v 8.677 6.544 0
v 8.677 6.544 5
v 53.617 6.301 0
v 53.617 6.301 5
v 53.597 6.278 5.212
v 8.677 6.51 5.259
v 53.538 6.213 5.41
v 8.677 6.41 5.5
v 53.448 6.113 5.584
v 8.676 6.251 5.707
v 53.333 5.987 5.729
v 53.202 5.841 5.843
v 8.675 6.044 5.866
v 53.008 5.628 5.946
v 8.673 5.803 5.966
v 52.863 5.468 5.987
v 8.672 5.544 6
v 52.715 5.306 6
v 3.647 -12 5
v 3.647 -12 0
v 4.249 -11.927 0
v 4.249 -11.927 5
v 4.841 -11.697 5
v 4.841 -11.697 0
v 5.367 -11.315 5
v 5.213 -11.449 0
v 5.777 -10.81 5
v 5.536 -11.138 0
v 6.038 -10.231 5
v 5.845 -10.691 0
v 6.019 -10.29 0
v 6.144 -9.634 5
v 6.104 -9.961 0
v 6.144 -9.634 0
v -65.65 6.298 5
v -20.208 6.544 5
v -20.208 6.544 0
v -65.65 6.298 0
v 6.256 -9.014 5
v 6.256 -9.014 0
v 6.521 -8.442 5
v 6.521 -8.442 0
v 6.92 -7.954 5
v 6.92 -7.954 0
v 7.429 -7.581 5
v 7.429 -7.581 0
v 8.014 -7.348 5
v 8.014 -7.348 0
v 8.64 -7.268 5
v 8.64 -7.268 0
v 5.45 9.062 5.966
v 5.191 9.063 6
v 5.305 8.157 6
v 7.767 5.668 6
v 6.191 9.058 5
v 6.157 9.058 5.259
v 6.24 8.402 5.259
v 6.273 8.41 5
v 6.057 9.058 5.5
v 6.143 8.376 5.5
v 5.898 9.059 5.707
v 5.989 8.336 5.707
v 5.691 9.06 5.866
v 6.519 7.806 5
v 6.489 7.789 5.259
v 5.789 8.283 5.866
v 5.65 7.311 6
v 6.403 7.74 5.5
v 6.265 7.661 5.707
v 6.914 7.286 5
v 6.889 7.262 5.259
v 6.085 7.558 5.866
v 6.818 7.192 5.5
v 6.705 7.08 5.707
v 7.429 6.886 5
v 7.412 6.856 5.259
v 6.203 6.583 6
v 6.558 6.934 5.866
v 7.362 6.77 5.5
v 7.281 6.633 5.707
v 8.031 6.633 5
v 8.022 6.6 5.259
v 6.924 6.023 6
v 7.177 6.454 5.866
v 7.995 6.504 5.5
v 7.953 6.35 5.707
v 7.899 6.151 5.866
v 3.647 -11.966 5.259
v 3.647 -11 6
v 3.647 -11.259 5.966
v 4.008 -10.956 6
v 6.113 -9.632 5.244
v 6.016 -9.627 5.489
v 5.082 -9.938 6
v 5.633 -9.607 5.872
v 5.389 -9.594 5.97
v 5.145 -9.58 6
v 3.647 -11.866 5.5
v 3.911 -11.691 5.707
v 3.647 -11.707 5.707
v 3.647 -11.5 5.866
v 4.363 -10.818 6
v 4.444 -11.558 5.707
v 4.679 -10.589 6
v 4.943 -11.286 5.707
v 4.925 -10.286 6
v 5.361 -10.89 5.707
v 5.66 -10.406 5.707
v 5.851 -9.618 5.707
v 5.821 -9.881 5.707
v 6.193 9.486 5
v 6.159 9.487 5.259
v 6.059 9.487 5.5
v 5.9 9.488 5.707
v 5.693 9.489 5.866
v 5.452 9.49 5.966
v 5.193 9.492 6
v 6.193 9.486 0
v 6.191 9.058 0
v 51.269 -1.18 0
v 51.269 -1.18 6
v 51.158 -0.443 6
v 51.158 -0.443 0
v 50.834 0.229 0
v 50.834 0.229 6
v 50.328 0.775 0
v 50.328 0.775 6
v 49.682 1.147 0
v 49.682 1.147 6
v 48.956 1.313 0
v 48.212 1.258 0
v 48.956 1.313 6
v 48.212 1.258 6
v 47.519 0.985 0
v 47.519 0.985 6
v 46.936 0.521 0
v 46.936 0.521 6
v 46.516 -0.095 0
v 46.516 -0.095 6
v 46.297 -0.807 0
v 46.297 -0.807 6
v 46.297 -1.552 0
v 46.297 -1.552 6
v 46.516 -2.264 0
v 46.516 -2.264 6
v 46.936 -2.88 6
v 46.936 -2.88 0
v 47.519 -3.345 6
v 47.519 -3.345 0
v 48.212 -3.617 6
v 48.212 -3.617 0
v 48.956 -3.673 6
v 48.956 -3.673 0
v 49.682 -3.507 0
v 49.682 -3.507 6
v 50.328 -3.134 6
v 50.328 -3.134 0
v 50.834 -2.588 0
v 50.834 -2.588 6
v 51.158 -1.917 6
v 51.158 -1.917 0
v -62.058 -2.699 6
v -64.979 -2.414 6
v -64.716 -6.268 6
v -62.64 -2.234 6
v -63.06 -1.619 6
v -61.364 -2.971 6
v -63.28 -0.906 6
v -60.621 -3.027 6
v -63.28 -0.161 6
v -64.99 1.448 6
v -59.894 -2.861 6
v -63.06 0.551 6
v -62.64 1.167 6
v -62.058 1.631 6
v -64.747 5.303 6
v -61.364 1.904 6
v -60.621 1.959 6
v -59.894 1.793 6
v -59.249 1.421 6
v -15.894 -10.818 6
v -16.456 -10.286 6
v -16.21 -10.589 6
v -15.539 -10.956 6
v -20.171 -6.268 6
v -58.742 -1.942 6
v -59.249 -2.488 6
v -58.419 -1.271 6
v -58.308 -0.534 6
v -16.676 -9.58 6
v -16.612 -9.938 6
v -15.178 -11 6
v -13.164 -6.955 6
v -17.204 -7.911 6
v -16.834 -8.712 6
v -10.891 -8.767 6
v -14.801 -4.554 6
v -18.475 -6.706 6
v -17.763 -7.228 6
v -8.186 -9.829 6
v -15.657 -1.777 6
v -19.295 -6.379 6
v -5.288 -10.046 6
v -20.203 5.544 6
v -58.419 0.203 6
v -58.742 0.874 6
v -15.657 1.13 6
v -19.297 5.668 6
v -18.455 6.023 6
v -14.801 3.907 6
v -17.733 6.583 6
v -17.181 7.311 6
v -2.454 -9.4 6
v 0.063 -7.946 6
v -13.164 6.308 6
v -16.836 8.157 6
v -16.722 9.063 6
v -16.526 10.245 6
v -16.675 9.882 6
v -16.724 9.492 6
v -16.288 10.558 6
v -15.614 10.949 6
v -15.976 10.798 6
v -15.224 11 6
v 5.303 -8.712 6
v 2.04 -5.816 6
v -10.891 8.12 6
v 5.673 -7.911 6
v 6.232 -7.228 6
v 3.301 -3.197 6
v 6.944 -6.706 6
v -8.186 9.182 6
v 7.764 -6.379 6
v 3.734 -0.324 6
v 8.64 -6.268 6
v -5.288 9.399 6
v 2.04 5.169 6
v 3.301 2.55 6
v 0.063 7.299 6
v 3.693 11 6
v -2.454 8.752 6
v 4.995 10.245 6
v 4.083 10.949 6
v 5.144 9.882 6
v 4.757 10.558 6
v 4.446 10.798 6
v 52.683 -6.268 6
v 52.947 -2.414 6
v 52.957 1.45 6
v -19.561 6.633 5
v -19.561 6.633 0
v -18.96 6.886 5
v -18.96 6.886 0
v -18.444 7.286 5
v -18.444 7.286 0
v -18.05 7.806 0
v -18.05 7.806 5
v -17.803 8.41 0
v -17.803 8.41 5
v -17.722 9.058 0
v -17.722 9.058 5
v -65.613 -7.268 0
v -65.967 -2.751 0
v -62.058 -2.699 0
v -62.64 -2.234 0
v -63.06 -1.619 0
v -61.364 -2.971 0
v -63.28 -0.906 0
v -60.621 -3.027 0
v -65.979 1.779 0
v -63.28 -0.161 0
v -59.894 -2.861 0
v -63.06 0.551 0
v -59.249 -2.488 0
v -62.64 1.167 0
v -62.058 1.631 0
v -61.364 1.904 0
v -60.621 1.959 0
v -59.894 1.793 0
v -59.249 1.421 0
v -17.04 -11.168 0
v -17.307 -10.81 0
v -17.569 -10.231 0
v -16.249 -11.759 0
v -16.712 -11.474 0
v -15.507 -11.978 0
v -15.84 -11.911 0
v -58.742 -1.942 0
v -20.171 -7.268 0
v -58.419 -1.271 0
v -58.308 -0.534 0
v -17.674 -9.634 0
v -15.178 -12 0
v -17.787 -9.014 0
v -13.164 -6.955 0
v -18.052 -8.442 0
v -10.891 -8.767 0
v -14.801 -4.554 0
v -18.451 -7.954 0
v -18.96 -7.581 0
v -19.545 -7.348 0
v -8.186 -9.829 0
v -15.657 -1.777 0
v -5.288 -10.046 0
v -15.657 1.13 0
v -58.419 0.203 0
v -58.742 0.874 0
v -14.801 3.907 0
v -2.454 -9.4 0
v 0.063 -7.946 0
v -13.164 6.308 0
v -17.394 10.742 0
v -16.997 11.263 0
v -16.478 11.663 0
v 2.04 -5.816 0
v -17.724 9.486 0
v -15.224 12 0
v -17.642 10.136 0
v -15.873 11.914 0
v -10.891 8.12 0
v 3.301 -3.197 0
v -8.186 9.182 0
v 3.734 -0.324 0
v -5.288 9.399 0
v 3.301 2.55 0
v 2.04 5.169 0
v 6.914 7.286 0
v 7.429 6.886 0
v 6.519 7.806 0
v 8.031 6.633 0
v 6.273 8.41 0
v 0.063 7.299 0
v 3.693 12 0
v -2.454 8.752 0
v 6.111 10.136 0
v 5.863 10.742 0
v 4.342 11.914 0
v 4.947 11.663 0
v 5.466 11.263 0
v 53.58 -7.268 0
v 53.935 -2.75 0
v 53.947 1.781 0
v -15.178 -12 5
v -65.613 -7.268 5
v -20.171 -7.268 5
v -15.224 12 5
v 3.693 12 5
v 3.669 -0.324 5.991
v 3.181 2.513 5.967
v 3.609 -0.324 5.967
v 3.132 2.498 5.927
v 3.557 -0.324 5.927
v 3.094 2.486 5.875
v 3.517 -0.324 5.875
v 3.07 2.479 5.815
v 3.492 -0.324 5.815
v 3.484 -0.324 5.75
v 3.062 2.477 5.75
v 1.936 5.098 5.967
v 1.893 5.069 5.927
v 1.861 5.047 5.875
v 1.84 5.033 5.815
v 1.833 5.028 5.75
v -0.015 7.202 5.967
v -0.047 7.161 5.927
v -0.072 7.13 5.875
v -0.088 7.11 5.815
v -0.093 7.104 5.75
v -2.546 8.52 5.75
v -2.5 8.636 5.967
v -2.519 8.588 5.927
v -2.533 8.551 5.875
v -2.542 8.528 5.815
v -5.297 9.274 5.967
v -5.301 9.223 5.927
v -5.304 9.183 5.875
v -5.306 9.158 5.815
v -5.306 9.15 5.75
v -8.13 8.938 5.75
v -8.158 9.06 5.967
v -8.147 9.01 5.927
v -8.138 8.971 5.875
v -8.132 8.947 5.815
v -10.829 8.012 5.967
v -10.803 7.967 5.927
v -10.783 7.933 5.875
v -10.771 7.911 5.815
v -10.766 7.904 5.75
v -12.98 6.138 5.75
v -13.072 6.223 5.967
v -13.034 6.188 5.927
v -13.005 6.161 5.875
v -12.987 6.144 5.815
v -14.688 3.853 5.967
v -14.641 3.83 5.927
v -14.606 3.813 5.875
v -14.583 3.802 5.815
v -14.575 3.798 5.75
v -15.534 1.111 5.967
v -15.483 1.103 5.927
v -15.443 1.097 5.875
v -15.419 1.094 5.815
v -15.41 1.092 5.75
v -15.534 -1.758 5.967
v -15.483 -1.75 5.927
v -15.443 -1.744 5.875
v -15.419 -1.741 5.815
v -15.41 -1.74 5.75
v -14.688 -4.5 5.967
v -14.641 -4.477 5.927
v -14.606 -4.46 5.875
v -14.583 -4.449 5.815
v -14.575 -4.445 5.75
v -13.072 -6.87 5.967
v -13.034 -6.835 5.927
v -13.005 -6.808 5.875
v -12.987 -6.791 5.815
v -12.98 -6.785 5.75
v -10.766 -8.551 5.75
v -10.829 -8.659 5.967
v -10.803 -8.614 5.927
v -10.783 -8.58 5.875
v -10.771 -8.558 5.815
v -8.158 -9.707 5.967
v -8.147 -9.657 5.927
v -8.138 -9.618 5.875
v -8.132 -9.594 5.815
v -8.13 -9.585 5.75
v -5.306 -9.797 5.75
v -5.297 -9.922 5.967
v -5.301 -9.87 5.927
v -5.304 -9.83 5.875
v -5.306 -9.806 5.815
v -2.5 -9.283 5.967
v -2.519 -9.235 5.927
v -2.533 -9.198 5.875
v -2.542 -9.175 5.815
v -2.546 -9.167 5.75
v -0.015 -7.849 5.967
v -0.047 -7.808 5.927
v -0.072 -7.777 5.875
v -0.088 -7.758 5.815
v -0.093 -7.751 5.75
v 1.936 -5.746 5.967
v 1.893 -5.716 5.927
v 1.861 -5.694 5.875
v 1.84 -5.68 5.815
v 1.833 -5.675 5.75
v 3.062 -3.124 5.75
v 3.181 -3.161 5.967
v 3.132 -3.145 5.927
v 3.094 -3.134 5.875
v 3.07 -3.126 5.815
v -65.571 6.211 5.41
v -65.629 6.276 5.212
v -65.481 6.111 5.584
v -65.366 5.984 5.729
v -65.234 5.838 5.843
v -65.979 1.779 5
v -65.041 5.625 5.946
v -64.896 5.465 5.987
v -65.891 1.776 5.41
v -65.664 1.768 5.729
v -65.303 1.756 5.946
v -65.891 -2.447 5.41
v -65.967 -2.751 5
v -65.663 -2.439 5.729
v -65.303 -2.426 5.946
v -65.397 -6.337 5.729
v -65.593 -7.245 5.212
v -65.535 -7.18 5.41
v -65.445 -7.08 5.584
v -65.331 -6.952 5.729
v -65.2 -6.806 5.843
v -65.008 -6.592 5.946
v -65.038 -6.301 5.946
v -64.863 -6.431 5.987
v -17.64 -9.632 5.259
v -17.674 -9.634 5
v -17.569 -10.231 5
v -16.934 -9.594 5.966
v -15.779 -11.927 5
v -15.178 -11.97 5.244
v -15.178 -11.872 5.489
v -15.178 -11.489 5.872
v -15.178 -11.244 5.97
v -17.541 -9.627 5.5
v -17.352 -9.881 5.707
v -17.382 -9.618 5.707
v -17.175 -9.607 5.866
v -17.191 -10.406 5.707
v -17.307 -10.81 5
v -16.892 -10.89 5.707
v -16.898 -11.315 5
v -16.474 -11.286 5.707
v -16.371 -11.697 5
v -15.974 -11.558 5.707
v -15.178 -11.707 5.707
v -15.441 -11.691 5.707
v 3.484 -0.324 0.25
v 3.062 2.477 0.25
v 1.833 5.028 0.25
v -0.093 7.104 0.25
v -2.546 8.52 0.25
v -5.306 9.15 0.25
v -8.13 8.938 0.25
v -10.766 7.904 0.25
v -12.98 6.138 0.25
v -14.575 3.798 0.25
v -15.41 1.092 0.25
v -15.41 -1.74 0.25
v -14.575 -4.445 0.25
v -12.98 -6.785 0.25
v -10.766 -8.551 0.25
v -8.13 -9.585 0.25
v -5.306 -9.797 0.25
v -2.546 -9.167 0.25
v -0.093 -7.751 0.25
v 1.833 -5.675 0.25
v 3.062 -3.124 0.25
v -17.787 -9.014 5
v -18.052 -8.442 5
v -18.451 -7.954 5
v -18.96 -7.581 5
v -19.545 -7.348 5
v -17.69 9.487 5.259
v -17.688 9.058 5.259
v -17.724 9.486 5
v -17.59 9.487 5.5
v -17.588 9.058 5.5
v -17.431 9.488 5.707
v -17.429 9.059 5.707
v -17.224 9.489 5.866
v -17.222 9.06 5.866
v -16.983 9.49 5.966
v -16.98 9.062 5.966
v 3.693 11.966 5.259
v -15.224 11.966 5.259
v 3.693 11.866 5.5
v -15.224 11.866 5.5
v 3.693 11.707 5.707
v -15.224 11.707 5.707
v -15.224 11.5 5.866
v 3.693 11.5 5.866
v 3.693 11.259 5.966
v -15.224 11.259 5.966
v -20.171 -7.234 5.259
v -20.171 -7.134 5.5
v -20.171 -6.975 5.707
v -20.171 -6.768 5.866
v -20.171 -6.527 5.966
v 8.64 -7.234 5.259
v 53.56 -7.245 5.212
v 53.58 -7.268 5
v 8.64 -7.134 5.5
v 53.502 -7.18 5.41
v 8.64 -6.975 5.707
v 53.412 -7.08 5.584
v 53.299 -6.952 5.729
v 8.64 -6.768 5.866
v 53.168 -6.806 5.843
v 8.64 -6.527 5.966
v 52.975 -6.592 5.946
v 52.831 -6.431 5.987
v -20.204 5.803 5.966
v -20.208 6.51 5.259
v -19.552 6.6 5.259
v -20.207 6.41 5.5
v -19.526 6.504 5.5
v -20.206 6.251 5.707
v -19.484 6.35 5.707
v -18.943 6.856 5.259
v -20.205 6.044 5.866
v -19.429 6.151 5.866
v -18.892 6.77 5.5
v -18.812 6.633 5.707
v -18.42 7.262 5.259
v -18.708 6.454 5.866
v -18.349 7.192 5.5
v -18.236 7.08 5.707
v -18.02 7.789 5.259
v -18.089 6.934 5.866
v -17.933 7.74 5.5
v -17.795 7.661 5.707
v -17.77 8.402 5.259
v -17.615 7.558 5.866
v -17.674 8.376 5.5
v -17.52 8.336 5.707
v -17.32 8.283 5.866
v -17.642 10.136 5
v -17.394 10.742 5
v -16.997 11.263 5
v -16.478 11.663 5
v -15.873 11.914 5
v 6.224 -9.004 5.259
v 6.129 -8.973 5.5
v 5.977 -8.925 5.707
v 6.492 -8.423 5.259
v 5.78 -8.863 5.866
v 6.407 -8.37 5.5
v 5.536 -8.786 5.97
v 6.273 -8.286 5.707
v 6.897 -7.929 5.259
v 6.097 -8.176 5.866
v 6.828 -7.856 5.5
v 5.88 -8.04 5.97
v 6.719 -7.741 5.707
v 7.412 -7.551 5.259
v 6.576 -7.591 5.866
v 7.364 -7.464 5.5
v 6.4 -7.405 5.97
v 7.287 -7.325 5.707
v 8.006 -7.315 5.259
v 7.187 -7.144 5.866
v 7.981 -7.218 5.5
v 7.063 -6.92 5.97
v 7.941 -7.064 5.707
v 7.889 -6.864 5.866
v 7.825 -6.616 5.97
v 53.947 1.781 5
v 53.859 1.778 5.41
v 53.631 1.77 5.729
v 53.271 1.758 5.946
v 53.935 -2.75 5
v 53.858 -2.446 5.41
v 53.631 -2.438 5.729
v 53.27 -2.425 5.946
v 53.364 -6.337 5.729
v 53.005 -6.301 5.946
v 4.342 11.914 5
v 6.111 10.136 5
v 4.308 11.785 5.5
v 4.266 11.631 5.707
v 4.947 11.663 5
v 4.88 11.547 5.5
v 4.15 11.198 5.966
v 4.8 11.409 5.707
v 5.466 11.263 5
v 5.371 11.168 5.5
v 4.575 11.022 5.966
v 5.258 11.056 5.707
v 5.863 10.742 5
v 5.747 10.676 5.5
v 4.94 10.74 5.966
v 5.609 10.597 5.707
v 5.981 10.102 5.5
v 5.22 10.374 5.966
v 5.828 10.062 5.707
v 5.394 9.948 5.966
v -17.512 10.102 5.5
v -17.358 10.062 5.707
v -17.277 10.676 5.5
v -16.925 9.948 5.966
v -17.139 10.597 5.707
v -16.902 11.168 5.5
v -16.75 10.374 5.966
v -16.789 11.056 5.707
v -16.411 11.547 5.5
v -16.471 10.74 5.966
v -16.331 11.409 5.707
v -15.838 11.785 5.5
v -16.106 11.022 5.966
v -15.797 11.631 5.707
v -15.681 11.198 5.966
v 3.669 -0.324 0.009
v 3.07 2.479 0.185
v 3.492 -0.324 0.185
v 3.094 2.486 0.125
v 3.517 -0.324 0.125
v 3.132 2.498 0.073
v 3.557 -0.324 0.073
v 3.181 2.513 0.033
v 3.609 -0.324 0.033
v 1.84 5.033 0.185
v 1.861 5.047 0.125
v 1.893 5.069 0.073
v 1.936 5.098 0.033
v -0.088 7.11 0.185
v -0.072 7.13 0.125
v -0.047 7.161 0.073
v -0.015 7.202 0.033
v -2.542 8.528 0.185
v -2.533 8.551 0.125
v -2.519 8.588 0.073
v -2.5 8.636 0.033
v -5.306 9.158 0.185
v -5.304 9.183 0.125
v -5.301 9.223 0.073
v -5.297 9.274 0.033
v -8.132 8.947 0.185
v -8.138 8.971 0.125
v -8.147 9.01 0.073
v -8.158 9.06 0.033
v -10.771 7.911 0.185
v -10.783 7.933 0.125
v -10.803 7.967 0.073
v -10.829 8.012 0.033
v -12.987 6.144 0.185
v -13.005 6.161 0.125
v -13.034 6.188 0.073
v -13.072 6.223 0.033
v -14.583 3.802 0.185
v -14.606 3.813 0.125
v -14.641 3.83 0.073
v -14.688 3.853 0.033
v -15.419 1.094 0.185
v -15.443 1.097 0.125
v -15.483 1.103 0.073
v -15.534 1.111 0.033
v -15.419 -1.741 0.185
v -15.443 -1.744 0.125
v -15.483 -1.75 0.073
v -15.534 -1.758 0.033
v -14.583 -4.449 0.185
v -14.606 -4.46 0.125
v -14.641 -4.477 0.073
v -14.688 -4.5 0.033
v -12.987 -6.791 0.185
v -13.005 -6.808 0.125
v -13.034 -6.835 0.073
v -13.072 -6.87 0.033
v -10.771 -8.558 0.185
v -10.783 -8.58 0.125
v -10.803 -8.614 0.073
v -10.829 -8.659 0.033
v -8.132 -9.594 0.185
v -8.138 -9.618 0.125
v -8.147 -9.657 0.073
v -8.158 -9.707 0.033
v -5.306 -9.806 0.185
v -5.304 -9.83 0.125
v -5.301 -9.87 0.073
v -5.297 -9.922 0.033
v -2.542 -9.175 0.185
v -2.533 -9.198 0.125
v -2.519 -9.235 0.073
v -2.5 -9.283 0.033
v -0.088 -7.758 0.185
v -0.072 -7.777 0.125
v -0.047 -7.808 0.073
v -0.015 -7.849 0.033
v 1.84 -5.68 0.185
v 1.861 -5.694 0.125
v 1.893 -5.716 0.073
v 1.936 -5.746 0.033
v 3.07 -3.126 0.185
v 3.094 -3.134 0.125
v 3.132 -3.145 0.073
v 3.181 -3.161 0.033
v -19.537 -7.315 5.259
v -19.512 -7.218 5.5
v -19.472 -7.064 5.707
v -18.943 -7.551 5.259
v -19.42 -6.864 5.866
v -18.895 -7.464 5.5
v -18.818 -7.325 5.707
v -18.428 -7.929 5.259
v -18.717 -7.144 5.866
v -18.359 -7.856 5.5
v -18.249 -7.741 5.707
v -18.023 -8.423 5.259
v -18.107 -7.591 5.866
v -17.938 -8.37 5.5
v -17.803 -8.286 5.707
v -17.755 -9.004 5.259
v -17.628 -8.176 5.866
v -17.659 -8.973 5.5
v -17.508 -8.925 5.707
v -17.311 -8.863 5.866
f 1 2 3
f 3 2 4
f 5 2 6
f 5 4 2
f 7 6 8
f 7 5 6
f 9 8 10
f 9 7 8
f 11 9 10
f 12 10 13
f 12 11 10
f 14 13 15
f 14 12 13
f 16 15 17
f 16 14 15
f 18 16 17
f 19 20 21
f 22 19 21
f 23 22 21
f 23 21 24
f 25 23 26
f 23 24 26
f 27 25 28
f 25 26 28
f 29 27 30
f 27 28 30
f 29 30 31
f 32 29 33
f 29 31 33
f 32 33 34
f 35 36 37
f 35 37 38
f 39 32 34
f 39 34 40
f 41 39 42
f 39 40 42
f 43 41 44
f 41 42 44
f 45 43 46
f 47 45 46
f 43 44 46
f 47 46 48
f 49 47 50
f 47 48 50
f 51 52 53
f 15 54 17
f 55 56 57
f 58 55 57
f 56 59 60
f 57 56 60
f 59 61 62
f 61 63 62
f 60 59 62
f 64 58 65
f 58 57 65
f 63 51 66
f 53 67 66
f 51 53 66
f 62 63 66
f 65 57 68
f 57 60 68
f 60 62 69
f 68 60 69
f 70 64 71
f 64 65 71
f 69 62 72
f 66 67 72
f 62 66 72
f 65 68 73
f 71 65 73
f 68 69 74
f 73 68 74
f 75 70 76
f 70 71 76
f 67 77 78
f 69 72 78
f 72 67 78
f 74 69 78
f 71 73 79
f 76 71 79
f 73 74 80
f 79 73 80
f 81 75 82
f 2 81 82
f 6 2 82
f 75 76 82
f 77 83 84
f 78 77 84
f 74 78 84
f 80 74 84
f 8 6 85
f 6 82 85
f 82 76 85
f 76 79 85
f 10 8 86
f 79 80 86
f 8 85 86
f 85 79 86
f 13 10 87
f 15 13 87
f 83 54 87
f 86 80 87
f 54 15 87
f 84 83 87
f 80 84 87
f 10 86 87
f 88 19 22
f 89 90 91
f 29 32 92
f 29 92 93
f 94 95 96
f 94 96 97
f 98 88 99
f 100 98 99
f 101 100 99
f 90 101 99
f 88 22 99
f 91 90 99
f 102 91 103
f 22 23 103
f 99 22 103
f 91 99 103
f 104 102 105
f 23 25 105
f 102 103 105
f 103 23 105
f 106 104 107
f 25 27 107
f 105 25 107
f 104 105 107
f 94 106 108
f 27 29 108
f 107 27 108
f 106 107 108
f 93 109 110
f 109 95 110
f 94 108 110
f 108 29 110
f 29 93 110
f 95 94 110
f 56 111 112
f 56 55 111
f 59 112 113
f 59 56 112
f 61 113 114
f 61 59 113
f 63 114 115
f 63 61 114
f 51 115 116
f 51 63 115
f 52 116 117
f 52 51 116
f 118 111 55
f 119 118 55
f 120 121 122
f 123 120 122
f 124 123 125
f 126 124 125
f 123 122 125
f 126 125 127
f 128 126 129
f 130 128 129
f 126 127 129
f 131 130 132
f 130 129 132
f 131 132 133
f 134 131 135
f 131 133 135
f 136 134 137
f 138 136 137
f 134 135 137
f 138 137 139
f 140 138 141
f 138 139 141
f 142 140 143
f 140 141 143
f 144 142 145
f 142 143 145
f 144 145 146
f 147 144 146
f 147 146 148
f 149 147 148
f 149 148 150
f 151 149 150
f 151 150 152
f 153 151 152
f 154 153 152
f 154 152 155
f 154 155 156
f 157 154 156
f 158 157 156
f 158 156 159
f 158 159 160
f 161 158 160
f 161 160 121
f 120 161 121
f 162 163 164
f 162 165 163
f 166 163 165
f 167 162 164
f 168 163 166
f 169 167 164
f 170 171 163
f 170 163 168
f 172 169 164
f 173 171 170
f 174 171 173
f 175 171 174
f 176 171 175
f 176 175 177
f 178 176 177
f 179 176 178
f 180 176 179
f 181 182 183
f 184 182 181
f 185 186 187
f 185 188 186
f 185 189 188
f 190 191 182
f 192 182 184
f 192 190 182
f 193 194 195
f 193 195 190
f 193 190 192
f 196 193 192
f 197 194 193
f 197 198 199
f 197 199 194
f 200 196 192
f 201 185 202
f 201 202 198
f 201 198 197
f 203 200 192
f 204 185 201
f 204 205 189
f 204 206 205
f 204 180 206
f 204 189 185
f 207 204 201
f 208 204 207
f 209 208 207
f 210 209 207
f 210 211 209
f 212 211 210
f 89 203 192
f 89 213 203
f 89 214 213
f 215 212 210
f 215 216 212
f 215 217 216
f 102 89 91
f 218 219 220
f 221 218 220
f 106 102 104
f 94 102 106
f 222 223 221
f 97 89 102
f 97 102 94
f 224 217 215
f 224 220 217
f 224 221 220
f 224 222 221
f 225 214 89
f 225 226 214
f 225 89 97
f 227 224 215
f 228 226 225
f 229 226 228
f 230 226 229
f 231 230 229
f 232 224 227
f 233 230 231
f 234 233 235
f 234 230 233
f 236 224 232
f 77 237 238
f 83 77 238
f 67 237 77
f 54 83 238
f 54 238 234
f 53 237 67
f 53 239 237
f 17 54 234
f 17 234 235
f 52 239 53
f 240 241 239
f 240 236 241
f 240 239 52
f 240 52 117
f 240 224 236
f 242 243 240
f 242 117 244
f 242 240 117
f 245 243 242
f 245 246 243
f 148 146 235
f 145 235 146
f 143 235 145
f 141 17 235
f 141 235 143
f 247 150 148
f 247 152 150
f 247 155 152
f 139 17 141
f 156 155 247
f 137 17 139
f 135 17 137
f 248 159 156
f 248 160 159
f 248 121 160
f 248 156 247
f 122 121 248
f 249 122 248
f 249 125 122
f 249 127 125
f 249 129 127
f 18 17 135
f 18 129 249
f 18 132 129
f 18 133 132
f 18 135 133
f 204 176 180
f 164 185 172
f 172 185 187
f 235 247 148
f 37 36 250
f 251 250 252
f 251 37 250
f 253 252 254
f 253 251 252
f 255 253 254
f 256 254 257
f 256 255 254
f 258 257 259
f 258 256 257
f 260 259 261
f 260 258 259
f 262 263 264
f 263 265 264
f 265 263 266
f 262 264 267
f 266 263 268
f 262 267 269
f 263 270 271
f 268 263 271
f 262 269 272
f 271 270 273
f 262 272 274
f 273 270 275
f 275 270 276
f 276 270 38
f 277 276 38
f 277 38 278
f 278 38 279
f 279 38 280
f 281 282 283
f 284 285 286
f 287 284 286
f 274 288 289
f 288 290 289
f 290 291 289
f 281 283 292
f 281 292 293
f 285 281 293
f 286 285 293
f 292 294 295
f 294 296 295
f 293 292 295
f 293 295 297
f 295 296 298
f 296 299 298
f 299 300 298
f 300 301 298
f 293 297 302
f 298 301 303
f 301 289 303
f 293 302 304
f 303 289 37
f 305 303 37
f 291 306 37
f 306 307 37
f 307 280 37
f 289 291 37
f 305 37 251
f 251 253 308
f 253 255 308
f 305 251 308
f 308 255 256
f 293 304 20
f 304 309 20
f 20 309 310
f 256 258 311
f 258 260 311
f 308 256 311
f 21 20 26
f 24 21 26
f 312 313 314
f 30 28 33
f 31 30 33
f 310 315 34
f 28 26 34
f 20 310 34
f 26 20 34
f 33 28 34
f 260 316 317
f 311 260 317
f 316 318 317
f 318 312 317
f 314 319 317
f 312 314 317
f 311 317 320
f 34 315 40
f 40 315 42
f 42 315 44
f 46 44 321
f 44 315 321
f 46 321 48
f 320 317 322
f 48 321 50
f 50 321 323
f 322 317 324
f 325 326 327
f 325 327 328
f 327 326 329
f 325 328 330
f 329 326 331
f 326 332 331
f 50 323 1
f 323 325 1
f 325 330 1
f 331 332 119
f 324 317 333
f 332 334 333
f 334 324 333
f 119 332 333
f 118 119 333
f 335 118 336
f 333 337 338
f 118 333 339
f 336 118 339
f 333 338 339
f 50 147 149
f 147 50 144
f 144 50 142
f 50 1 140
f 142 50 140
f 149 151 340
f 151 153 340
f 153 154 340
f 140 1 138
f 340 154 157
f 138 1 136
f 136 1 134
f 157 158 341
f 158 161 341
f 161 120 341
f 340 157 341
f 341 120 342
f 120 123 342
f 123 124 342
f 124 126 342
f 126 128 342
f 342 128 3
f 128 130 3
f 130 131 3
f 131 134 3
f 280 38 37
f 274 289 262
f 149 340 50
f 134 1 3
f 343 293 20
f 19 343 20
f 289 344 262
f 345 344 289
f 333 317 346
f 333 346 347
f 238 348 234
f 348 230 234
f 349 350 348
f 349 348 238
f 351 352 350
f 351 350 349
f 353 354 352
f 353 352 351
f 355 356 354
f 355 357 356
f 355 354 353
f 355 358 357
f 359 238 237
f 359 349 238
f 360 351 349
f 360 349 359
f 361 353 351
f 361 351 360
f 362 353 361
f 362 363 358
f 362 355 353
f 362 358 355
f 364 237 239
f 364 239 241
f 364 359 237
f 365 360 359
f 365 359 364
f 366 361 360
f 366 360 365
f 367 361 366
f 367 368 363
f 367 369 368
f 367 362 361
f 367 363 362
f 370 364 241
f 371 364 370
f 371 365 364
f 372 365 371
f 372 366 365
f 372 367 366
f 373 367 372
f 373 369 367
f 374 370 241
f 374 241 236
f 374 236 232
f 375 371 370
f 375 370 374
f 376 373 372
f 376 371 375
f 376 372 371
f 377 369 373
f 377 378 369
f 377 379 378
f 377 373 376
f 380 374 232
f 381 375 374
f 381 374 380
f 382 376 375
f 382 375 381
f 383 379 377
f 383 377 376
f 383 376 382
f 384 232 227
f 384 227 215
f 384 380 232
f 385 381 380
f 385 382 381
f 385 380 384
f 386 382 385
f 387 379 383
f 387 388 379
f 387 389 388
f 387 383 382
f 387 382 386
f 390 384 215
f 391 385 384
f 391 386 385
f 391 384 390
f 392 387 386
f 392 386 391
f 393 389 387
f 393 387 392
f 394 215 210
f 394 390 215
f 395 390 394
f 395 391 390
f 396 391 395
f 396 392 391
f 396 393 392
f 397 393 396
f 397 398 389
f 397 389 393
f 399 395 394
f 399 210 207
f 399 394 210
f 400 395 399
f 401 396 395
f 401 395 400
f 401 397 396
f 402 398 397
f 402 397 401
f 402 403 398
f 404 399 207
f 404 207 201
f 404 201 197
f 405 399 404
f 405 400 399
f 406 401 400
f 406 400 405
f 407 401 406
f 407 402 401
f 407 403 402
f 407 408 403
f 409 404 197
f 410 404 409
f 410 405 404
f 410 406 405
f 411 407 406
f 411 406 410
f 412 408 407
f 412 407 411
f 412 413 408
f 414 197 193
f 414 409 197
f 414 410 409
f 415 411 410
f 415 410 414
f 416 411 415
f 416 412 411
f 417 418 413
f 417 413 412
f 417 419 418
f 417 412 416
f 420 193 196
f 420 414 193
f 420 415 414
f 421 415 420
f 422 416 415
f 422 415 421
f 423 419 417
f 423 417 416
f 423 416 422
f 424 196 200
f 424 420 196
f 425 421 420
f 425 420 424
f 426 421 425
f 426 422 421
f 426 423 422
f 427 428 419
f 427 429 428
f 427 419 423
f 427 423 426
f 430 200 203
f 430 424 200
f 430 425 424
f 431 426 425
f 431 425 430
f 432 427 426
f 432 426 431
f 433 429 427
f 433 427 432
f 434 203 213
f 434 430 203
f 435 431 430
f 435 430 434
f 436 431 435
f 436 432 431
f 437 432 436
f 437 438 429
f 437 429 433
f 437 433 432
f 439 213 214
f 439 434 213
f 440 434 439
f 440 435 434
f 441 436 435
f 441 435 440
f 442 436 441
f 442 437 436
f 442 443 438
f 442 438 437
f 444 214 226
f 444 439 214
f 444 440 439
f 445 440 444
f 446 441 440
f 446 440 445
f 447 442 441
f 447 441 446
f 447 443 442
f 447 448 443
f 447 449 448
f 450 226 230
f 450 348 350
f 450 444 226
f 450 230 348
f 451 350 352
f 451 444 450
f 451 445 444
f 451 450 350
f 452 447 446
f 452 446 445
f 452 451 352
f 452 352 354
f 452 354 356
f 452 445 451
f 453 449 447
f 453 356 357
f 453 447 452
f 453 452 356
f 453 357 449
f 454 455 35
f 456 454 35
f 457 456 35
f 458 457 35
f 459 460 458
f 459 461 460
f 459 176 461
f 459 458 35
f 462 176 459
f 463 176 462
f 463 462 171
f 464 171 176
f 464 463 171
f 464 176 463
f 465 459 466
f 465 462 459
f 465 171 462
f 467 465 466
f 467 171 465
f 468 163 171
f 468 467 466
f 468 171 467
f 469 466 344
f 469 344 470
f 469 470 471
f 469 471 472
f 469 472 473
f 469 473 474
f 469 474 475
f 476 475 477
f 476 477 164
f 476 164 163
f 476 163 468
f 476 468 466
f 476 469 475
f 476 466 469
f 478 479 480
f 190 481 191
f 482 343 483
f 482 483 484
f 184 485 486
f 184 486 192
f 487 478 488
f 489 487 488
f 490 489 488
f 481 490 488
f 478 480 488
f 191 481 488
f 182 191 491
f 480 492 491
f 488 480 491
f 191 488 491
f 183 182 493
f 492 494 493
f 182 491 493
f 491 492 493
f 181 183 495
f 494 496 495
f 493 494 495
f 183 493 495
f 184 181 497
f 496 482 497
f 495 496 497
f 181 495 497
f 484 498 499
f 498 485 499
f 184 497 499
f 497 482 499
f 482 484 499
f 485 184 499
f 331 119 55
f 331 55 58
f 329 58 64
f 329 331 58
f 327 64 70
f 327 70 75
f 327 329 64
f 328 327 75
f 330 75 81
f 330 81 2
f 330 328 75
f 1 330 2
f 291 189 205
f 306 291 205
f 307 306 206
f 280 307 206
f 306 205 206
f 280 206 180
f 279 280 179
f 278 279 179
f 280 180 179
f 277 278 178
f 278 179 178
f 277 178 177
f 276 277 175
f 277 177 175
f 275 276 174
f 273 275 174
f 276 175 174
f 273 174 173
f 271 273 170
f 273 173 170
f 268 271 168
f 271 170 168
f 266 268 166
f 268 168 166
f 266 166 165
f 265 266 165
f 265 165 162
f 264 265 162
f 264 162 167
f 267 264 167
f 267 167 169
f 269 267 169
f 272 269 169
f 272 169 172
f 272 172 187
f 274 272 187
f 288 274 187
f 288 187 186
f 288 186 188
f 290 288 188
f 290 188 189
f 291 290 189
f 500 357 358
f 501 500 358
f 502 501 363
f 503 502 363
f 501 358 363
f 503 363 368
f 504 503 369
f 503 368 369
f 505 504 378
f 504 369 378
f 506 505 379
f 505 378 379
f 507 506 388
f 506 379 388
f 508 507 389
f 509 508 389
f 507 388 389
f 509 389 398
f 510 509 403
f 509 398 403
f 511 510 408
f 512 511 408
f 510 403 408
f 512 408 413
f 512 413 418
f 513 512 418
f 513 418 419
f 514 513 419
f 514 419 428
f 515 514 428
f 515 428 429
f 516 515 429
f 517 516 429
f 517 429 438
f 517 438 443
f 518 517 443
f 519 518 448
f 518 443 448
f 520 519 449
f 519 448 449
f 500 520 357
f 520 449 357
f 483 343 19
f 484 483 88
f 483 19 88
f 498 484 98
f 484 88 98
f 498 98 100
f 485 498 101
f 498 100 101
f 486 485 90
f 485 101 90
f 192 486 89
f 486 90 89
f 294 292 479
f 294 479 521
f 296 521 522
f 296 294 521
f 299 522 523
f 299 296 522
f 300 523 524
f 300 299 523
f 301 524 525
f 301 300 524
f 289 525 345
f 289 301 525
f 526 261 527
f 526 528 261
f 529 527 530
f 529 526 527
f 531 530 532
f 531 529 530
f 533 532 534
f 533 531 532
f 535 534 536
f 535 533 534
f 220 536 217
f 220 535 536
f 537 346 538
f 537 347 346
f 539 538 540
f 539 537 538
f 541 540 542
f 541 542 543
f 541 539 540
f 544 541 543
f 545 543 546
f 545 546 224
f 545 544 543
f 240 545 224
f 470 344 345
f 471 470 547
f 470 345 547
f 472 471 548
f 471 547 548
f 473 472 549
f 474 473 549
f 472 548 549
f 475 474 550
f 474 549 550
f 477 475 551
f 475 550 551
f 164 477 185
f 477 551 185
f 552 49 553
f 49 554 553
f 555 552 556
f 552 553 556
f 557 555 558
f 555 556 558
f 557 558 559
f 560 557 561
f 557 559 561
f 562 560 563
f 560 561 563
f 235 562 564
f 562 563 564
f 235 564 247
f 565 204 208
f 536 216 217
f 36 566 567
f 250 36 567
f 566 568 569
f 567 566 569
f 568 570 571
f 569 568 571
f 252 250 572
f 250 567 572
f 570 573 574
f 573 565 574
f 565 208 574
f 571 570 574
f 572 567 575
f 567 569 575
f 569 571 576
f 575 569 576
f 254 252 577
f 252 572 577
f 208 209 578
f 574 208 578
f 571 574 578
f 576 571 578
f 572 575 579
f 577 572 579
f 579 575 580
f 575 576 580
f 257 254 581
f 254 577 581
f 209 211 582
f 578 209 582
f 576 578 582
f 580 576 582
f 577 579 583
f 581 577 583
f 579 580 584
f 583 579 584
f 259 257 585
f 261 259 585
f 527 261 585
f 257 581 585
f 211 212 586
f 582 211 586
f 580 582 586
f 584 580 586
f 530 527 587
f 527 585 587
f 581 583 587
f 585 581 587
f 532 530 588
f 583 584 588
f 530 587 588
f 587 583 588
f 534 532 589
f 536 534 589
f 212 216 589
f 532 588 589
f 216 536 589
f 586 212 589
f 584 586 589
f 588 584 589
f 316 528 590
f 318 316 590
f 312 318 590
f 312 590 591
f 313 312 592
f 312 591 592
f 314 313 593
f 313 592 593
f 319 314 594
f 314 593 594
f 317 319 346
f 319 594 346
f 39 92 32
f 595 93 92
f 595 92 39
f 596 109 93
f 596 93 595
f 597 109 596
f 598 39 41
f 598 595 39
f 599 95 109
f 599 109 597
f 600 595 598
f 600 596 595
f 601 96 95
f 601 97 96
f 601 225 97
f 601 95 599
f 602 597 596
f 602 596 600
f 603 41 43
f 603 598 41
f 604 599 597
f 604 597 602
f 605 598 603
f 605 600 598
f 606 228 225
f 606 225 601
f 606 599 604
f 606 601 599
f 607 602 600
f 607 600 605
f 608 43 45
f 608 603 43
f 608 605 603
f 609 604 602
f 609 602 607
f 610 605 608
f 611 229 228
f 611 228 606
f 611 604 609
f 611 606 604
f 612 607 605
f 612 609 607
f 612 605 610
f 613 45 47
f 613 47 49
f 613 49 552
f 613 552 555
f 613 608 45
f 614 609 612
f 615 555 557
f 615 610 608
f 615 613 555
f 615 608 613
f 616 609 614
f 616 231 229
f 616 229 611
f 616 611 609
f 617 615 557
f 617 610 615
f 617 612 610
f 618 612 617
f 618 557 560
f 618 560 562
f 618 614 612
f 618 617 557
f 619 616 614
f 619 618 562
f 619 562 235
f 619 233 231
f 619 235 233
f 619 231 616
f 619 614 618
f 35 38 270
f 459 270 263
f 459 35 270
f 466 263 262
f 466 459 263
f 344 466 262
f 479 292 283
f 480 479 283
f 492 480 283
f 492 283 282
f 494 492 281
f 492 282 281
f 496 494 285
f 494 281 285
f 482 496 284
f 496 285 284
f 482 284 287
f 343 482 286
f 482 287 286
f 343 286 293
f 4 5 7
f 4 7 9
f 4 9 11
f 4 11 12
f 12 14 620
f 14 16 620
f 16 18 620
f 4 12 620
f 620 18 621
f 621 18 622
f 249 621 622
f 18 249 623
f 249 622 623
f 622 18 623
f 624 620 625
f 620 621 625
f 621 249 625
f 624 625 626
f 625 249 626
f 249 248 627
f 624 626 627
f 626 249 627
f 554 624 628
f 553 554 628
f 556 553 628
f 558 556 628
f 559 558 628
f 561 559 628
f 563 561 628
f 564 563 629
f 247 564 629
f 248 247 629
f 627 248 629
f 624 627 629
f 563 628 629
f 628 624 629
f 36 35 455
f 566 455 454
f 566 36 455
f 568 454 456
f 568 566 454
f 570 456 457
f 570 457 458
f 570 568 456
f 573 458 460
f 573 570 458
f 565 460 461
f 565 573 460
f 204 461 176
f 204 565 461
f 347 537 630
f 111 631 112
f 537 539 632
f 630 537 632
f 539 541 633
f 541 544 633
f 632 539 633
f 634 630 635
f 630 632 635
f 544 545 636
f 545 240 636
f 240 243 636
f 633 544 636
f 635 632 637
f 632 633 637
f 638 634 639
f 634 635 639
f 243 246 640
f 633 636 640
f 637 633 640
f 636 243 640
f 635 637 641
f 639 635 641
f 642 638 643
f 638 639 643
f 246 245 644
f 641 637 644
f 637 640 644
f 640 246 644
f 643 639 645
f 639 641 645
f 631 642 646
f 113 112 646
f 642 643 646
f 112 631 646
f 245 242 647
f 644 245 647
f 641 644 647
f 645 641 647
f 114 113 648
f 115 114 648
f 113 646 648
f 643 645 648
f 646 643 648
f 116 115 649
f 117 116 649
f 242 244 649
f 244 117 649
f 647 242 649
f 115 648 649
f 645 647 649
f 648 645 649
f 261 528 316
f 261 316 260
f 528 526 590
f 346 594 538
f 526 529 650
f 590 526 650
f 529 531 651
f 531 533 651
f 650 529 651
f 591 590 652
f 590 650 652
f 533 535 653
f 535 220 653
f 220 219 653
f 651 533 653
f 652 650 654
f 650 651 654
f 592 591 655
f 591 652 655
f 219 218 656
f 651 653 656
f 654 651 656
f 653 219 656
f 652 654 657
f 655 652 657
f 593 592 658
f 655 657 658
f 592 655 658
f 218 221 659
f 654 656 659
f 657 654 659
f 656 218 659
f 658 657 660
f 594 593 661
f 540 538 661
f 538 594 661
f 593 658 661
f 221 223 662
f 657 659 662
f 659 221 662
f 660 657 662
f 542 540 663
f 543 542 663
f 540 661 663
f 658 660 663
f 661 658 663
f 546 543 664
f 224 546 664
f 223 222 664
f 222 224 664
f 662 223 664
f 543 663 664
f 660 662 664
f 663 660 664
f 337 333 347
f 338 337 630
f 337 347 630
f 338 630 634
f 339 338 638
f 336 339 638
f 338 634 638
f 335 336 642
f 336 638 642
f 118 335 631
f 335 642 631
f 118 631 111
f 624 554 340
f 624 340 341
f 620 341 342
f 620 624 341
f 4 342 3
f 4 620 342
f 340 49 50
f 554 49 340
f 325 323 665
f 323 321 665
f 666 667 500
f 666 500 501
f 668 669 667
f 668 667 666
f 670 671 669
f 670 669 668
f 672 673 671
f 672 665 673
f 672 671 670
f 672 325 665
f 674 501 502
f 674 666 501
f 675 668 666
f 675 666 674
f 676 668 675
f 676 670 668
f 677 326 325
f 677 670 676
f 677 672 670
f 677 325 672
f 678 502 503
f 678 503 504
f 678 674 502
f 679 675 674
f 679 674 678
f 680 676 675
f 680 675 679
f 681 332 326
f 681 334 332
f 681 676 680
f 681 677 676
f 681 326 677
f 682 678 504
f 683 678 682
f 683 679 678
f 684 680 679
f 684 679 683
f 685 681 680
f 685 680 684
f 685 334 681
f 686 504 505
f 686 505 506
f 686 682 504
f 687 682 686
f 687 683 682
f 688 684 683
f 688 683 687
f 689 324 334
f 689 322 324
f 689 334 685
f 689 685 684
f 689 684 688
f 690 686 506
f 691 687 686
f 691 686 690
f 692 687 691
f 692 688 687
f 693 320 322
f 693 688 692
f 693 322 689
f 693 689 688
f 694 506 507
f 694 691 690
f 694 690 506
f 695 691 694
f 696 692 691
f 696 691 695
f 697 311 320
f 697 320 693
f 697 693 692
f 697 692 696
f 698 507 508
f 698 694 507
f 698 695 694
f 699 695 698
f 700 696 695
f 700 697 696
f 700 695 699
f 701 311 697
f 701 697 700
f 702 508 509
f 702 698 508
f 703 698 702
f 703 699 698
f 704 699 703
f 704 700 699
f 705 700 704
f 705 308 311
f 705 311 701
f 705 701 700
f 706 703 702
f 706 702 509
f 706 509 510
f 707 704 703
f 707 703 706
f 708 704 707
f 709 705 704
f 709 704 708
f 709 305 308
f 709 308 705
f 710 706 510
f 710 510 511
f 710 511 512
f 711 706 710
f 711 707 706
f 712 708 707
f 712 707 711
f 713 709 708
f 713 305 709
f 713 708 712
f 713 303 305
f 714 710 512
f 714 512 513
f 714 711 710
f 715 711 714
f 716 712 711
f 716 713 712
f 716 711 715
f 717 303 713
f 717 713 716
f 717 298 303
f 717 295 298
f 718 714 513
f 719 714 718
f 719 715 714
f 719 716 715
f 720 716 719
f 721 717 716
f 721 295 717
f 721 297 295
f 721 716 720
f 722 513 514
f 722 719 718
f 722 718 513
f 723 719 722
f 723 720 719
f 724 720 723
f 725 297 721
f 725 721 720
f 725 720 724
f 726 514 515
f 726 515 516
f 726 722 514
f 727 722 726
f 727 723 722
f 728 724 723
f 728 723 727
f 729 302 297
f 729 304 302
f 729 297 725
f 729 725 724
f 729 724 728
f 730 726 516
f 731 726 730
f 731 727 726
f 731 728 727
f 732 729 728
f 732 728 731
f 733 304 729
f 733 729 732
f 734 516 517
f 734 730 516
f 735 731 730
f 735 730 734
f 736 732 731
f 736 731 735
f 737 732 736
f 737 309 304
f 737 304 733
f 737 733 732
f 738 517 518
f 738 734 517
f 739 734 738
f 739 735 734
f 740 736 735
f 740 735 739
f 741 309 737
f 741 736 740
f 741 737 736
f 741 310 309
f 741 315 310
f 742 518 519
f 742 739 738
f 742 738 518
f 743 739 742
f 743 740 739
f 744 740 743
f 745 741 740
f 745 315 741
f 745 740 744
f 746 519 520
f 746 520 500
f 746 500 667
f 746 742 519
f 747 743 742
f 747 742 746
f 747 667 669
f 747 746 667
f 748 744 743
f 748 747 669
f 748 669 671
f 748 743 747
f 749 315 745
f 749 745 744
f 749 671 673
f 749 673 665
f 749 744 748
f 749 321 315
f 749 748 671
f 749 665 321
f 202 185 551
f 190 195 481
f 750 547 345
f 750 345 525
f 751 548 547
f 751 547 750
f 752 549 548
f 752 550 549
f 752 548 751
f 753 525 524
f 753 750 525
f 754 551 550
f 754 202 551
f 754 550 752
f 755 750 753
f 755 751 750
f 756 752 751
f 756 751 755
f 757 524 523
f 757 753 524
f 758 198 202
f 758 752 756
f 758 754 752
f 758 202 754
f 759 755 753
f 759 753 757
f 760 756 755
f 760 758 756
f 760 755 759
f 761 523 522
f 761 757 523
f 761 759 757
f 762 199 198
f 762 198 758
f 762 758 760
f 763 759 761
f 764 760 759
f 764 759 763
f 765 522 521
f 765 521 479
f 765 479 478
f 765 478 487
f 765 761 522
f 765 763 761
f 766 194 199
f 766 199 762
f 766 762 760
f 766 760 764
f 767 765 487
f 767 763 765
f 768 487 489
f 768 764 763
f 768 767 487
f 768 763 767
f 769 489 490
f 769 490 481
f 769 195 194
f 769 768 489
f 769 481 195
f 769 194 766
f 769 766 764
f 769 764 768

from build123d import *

# Parameters (mm, degrees)
ESQUISSE1_W             = 200
ESQUISSE1_H             = 24
BOSS_EXTRU_1_DEPTH      = 6
ESQUISSE3_R             = 9.5
ENL_V_MAT_EXTRU_1_DEPTH = 6
ESQUISSE4_R             = 114.275088212
ESQUISSE4_R_2           = 60
ENL_V_MAT_EXTRU_2_DEPTH = 6
ESQUISSE5_W             = 52.011744551
ESQUISSE5_H             = 15.54113196
ESQUISSE5_W_2           = 52.011744552
ENL_V_MAT_EXTRU_3_DEPTH = 6
CONG_1_R                = 2.5
CONG_2_R                = 2.5
CONG_3_R                = 1
CONG_4_R                = 0.25
CONG_5_R                = 0.25
ESQUISSE6_R             = 2.5
ENL_V_MAT_EXTRU_4_DEPTH = 68.365782888


with BuildPart() as part:
    # Esquisse1 → Boss.-Extru.1 (new body)
    with BuildSketch(Plane.XY):
        with Locations((-5.765391807, 0)):
            Rectangle(ESQUISSE1_W, ESQUISSE1_H)
    extrude(amount=BOSS_EXTRU_1_DEPTH)

    # Esquisse3 → Enlèv. mat.-Extru.1 (cut)
    with BuildSketch(Plane.XY.offset(6)):
        with Locations((-6.016275927, -0.323603958)):
            Circle(ESQUISSE3_R)
    extrude(amount=-ENL_V_MAT_EXTRU_1_DEPTH, mode=Mode.SUBTRACT)

    # Esquisse4 → Enlèv. mat.-Extru.2 (cut)
    with BuildSketch(Plane.XY.offset(6)):
        with Locations((-6.016275927, -0.323603958)):
            Circle(ESQUISSE4_R)
        with Locations((-6.016275927, -0.323603958)):
            Circle(ESQUISSE4_R_2, mode=Mode.SUBTRACT)
    extrude(amount=-ENL_V_MAT_EXTRU_2_DEPTH, mode=Mode.SUBTRACT)

    # Esquisse5 → Enlèv. mat.-Extru.3 (cut)
    with BuildSketch(Plane.XY.offset(6)):
        Polygon((-69.803207514, 21.817117384), (-17.792224869, 22.098641011), (-17.708105486, 6.557736709), (-69.719088132, 6.276213083), align=None)
        with Locations((-43.676559905, -15.038694091)):
            Rectangle(ESQUISSE5_W, ESQUISSE5_H)
        with Locations((32.145776291, -15.038694091)):
            Rectangle(ESQUISSE5_W_2, ESQUISSE5_H)
        Polygon((58.188304518, 6.276213083), (58.272423901, 21.817117384), (6.261441255, 22.098641011), (6.177321873, 6.557736709), align=None)
    extrude(amount=-ENL_V_MAT_EXTRU_3_DEPTH, mode=Mode.SUBTRACT)

    # Congé1
    cong_1_edges = [part.edges().sort_by_distance(p)[0] for p in [
        (-17.708105486, 6.557736709, 3),
        (6.139904015, -7.268128111, 3),
        (6.177321873, 6.557736709, 3),
        (-17.670687629, -7.268128111, 3),
    ]]
    fillet(cong_1_edges, radius=CONG_1_R)

    # Congé2
    cong_2_edges = [part.edges().sort_by_distance(p)[0] for p in [
        (6.206779607, 12, 3),
        (-17.73756322, 12, 3),
        (-17.670687629, -12, 3),
        (6.139904015, -12, 3),
    ]]
    fillet(cong_2_edges, radius=CONG_2_R)

    # Congé3
    cong_3_edges = [part.edges().sort_by_distance(p)[0] for p in [
        (31.147090613, 6.422581027, 6),
        (-42.891860863, -7.268128111, 6),
        (-17.722797632, 9.272084177, 6),
        (6.913507547, 7.285995677, 6),
        (-18.450972556, -7.953581317, 6),
        (-18.44429116, 7.285995677, 6),
        (-5.765391807, 12, 6),
        (6.192014019, 9.272084177, 6),
        (-5.765391807, -12, 6),
        (6.920188943, -7.953581317, 6),
        (5.366813532, -11.314546795, 6),
        (-16.897597145, -11.314546795, 6),
        (-16.996539353, 11.262976271, 6),
        (5.46575574, 11.262976271, 6),
        (53.983508026, -0.484618209, 6),
        (-66.016056196, -0.485985355, 6),
        (-42.928909262, 6.421222231, 6),
        (31.110193129, -7.268128111, 6),
    ]]
    fillet(cong_3_edges, radius=CONG_3_R)

    # Congé4
    cong_4_edges = [part.edges().sort_by_distance(p)[0] for p in [
        (-15.516275927, -0.323603958, 6),
    ]]
    fillet(cong_4_edges, radius=CONG_4_R)

    # Congé5
    cong_5_edges = [part.edges().sort_by_distance(p)[0] for p in [
        (-15.516275927, -0.323603958, 0),
    ]]
    fillet(cong_5_edges, radius=CONG_5_R)

    # Esquisse6 → Enlèv. mat.-Extru.4 (cut, through all)
    with BuildSketch(Plane.XY.offset(6)):
        with Locations((48.768783674, -1.17977957)):
            Circle(ESQUISSE6_R)
        with Locations((-60.807622013, -0.533809454)):
            Circle(ESQUISSE6_R)
    extrude(amount=-ENL_V_MAT_EXTRU_4_DEPTH, mode=Mode.SUBTRACT)


solid = part.part
